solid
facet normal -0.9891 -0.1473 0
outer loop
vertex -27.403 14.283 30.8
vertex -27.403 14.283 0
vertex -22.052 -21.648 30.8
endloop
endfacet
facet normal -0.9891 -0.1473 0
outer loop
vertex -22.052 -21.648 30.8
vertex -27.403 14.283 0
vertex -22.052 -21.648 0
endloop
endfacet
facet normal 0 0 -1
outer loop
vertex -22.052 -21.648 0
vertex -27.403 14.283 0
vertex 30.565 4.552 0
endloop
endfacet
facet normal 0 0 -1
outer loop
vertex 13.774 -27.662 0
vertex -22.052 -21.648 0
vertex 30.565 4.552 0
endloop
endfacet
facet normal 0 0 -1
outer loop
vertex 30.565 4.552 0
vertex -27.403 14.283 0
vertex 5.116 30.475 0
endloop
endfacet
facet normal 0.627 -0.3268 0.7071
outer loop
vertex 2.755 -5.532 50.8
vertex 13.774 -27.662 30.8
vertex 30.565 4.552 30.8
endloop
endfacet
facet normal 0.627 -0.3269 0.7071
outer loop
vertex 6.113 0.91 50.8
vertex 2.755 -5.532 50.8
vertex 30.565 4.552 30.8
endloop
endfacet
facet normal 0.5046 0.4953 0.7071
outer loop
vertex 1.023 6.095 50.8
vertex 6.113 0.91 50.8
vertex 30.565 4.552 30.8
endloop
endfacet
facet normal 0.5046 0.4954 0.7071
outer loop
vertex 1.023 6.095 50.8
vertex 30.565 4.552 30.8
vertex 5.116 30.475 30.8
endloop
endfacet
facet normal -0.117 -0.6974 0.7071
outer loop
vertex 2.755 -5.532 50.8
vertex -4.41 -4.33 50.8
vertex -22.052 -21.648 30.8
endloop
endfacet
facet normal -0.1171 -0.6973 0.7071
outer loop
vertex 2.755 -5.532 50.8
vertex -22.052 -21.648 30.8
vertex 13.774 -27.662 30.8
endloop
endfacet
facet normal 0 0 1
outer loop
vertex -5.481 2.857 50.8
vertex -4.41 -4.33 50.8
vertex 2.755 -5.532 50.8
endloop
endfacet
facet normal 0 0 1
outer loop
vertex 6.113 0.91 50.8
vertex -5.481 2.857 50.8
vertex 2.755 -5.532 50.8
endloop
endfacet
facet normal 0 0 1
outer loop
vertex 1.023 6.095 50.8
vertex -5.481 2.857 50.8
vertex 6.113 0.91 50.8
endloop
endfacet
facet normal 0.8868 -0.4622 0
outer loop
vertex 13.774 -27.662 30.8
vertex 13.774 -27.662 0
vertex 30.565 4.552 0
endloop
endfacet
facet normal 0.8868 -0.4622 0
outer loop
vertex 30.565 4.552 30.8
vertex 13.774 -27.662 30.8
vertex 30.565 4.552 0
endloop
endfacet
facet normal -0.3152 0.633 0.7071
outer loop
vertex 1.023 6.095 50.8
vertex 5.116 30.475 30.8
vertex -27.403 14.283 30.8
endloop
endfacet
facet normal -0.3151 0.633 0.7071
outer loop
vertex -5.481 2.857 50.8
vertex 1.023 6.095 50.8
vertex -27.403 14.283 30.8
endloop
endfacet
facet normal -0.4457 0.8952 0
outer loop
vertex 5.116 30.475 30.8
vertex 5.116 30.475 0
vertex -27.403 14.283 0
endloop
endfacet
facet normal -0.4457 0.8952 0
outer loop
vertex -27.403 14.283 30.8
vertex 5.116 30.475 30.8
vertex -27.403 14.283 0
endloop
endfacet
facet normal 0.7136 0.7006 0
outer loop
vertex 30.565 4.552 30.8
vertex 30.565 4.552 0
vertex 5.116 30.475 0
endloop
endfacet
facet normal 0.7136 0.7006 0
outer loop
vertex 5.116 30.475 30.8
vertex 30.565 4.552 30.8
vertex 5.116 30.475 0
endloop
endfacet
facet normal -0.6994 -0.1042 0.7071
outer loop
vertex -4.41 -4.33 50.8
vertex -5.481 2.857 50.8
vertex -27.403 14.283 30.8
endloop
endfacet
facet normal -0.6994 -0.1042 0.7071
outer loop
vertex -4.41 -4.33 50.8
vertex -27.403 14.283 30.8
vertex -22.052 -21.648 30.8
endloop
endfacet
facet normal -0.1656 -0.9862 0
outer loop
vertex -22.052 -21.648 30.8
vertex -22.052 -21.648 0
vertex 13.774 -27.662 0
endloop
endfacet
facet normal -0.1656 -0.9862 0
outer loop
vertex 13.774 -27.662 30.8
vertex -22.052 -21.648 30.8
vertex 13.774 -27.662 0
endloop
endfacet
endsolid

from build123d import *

# Parameters (mm, degrees)
F1_DEPTH = 50.8
F2_SIZE  = 20


with BuildPart() as f1:
    # F0 (on Top) → F1 (new body)
    with BuildSketch(Plane.XY):
        Polygon((13.774368, -27.66192), (30.564563, 4.552199), (5.115571, 30.475334), (-27.402966, 14.282593), (-22.051536, -21.648205), align=None)
    extrude(amount=F1_DEPTH)

    # F2
    f2_edges = [f1.edges().sort_by_distance(p)[0] for p in [
        (-4.138584, -24.655063, 50.8),
        (22.169465, -11.554861, 50.8),
        (17.840067, 17.513766, 50.8),
        (-11.143697, 22.378964, 50.8),
        (-24.727251, -3.682806, 50.8),
    ]]
    chamfer(f2_edges, length=F2_SIZE)


solid = f1.part
